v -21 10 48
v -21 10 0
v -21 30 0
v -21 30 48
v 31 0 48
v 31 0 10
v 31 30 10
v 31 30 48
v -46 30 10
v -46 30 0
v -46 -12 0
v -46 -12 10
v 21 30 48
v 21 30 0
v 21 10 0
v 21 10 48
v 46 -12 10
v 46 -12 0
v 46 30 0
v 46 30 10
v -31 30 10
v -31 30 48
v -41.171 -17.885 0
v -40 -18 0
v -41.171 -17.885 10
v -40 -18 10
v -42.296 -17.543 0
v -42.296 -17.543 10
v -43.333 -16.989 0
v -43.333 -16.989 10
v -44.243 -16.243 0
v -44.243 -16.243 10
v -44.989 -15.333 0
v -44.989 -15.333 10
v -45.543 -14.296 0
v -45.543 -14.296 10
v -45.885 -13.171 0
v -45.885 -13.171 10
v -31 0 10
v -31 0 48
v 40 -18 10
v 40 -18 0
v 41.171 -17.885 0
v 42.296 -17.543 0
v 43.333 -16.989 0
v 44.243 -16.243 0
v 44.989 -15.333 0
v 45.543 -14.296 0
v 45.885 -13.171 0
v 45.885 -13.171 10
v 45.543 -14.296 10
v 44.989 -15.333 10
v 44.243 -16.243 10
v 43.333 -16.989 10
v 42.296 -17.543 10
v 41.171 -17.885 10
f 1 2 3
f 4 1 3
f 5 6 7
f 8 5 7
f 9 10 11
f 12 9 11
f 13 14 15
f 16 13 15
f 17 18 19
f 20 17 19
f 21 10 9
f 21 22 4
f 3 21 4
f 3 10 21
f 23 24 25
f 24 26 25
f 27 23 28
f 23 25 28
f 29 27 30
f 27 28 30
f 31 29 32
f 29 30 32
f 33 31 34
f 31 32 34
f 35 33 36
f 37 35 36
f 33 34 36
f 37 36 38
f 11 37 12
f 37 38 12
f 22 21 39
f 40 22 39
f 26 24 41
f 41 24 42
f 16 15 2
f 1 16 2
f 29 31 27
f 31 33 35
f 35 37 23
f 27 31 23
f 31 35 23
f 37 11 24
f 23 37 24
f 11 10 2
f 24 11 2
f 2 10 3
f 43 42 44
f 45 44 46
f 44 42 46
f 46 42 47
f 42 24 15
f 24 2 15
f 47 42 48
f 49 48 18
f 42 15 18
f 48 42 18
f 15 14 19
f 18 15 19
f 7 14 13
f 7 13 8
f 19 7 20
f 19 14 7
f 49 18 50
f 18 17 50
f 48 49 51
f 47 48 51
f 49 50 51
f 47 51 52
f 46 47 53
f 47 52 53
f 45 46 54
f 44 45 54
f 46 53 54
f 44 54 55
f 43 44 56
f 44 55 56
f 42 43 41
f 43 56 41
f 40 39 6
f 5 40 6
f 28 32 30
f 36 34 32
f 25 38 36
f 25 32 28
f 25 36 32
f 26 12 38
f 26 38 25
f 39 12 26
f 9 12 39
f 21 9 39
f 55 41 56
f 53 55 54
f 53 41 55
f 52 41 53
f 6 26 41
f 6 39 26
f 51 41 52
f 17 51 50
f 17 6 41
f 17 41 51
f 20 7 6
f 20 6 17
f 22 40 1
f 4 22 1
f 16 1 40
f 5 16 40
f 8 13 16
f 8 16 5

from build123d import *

# Parameters (mm, degrees)
F1_DEPTH = 48
F0_W     = 15
F0_H     = 30
F2_DEPTH = 10
F3_R     = 6


with BuildPart() as f1:
    # F0 (on Top) → F1 (new body)
    with BuildSketch(Plane.XY):
        Polygon((21, 30), (21, 10), (-21, 10), (-21, 30), (-31, 30), (-31, 0), (31, 0), (31, 30), align=None)
    extrude(amount=F1_DEPTH)

    # F0 (on Top) → F2 (join)
    with BuildSketch(Plane.XY):
        Polygon((46, 0), (31, 0), (-31, 0), (-46, 0), (-46, -18), (46, -18), align=None)
        with Locations((38.5, 15)):
            Rectangle(F0_W, F0_H)
        with Locations((-38.5, 15)):
            Rectangle(F0_W, F0_H)
    extrude(amount=F2_DEPTH)

    # F3
    f3_edges = [f1.edges().sort_by_distance(p)[0] for p in [
        (46, -18, 5),
        (-46, -18, 5),
    ]]
    fillet(f3_edges, radius=F3_R)


solid = f1.part
